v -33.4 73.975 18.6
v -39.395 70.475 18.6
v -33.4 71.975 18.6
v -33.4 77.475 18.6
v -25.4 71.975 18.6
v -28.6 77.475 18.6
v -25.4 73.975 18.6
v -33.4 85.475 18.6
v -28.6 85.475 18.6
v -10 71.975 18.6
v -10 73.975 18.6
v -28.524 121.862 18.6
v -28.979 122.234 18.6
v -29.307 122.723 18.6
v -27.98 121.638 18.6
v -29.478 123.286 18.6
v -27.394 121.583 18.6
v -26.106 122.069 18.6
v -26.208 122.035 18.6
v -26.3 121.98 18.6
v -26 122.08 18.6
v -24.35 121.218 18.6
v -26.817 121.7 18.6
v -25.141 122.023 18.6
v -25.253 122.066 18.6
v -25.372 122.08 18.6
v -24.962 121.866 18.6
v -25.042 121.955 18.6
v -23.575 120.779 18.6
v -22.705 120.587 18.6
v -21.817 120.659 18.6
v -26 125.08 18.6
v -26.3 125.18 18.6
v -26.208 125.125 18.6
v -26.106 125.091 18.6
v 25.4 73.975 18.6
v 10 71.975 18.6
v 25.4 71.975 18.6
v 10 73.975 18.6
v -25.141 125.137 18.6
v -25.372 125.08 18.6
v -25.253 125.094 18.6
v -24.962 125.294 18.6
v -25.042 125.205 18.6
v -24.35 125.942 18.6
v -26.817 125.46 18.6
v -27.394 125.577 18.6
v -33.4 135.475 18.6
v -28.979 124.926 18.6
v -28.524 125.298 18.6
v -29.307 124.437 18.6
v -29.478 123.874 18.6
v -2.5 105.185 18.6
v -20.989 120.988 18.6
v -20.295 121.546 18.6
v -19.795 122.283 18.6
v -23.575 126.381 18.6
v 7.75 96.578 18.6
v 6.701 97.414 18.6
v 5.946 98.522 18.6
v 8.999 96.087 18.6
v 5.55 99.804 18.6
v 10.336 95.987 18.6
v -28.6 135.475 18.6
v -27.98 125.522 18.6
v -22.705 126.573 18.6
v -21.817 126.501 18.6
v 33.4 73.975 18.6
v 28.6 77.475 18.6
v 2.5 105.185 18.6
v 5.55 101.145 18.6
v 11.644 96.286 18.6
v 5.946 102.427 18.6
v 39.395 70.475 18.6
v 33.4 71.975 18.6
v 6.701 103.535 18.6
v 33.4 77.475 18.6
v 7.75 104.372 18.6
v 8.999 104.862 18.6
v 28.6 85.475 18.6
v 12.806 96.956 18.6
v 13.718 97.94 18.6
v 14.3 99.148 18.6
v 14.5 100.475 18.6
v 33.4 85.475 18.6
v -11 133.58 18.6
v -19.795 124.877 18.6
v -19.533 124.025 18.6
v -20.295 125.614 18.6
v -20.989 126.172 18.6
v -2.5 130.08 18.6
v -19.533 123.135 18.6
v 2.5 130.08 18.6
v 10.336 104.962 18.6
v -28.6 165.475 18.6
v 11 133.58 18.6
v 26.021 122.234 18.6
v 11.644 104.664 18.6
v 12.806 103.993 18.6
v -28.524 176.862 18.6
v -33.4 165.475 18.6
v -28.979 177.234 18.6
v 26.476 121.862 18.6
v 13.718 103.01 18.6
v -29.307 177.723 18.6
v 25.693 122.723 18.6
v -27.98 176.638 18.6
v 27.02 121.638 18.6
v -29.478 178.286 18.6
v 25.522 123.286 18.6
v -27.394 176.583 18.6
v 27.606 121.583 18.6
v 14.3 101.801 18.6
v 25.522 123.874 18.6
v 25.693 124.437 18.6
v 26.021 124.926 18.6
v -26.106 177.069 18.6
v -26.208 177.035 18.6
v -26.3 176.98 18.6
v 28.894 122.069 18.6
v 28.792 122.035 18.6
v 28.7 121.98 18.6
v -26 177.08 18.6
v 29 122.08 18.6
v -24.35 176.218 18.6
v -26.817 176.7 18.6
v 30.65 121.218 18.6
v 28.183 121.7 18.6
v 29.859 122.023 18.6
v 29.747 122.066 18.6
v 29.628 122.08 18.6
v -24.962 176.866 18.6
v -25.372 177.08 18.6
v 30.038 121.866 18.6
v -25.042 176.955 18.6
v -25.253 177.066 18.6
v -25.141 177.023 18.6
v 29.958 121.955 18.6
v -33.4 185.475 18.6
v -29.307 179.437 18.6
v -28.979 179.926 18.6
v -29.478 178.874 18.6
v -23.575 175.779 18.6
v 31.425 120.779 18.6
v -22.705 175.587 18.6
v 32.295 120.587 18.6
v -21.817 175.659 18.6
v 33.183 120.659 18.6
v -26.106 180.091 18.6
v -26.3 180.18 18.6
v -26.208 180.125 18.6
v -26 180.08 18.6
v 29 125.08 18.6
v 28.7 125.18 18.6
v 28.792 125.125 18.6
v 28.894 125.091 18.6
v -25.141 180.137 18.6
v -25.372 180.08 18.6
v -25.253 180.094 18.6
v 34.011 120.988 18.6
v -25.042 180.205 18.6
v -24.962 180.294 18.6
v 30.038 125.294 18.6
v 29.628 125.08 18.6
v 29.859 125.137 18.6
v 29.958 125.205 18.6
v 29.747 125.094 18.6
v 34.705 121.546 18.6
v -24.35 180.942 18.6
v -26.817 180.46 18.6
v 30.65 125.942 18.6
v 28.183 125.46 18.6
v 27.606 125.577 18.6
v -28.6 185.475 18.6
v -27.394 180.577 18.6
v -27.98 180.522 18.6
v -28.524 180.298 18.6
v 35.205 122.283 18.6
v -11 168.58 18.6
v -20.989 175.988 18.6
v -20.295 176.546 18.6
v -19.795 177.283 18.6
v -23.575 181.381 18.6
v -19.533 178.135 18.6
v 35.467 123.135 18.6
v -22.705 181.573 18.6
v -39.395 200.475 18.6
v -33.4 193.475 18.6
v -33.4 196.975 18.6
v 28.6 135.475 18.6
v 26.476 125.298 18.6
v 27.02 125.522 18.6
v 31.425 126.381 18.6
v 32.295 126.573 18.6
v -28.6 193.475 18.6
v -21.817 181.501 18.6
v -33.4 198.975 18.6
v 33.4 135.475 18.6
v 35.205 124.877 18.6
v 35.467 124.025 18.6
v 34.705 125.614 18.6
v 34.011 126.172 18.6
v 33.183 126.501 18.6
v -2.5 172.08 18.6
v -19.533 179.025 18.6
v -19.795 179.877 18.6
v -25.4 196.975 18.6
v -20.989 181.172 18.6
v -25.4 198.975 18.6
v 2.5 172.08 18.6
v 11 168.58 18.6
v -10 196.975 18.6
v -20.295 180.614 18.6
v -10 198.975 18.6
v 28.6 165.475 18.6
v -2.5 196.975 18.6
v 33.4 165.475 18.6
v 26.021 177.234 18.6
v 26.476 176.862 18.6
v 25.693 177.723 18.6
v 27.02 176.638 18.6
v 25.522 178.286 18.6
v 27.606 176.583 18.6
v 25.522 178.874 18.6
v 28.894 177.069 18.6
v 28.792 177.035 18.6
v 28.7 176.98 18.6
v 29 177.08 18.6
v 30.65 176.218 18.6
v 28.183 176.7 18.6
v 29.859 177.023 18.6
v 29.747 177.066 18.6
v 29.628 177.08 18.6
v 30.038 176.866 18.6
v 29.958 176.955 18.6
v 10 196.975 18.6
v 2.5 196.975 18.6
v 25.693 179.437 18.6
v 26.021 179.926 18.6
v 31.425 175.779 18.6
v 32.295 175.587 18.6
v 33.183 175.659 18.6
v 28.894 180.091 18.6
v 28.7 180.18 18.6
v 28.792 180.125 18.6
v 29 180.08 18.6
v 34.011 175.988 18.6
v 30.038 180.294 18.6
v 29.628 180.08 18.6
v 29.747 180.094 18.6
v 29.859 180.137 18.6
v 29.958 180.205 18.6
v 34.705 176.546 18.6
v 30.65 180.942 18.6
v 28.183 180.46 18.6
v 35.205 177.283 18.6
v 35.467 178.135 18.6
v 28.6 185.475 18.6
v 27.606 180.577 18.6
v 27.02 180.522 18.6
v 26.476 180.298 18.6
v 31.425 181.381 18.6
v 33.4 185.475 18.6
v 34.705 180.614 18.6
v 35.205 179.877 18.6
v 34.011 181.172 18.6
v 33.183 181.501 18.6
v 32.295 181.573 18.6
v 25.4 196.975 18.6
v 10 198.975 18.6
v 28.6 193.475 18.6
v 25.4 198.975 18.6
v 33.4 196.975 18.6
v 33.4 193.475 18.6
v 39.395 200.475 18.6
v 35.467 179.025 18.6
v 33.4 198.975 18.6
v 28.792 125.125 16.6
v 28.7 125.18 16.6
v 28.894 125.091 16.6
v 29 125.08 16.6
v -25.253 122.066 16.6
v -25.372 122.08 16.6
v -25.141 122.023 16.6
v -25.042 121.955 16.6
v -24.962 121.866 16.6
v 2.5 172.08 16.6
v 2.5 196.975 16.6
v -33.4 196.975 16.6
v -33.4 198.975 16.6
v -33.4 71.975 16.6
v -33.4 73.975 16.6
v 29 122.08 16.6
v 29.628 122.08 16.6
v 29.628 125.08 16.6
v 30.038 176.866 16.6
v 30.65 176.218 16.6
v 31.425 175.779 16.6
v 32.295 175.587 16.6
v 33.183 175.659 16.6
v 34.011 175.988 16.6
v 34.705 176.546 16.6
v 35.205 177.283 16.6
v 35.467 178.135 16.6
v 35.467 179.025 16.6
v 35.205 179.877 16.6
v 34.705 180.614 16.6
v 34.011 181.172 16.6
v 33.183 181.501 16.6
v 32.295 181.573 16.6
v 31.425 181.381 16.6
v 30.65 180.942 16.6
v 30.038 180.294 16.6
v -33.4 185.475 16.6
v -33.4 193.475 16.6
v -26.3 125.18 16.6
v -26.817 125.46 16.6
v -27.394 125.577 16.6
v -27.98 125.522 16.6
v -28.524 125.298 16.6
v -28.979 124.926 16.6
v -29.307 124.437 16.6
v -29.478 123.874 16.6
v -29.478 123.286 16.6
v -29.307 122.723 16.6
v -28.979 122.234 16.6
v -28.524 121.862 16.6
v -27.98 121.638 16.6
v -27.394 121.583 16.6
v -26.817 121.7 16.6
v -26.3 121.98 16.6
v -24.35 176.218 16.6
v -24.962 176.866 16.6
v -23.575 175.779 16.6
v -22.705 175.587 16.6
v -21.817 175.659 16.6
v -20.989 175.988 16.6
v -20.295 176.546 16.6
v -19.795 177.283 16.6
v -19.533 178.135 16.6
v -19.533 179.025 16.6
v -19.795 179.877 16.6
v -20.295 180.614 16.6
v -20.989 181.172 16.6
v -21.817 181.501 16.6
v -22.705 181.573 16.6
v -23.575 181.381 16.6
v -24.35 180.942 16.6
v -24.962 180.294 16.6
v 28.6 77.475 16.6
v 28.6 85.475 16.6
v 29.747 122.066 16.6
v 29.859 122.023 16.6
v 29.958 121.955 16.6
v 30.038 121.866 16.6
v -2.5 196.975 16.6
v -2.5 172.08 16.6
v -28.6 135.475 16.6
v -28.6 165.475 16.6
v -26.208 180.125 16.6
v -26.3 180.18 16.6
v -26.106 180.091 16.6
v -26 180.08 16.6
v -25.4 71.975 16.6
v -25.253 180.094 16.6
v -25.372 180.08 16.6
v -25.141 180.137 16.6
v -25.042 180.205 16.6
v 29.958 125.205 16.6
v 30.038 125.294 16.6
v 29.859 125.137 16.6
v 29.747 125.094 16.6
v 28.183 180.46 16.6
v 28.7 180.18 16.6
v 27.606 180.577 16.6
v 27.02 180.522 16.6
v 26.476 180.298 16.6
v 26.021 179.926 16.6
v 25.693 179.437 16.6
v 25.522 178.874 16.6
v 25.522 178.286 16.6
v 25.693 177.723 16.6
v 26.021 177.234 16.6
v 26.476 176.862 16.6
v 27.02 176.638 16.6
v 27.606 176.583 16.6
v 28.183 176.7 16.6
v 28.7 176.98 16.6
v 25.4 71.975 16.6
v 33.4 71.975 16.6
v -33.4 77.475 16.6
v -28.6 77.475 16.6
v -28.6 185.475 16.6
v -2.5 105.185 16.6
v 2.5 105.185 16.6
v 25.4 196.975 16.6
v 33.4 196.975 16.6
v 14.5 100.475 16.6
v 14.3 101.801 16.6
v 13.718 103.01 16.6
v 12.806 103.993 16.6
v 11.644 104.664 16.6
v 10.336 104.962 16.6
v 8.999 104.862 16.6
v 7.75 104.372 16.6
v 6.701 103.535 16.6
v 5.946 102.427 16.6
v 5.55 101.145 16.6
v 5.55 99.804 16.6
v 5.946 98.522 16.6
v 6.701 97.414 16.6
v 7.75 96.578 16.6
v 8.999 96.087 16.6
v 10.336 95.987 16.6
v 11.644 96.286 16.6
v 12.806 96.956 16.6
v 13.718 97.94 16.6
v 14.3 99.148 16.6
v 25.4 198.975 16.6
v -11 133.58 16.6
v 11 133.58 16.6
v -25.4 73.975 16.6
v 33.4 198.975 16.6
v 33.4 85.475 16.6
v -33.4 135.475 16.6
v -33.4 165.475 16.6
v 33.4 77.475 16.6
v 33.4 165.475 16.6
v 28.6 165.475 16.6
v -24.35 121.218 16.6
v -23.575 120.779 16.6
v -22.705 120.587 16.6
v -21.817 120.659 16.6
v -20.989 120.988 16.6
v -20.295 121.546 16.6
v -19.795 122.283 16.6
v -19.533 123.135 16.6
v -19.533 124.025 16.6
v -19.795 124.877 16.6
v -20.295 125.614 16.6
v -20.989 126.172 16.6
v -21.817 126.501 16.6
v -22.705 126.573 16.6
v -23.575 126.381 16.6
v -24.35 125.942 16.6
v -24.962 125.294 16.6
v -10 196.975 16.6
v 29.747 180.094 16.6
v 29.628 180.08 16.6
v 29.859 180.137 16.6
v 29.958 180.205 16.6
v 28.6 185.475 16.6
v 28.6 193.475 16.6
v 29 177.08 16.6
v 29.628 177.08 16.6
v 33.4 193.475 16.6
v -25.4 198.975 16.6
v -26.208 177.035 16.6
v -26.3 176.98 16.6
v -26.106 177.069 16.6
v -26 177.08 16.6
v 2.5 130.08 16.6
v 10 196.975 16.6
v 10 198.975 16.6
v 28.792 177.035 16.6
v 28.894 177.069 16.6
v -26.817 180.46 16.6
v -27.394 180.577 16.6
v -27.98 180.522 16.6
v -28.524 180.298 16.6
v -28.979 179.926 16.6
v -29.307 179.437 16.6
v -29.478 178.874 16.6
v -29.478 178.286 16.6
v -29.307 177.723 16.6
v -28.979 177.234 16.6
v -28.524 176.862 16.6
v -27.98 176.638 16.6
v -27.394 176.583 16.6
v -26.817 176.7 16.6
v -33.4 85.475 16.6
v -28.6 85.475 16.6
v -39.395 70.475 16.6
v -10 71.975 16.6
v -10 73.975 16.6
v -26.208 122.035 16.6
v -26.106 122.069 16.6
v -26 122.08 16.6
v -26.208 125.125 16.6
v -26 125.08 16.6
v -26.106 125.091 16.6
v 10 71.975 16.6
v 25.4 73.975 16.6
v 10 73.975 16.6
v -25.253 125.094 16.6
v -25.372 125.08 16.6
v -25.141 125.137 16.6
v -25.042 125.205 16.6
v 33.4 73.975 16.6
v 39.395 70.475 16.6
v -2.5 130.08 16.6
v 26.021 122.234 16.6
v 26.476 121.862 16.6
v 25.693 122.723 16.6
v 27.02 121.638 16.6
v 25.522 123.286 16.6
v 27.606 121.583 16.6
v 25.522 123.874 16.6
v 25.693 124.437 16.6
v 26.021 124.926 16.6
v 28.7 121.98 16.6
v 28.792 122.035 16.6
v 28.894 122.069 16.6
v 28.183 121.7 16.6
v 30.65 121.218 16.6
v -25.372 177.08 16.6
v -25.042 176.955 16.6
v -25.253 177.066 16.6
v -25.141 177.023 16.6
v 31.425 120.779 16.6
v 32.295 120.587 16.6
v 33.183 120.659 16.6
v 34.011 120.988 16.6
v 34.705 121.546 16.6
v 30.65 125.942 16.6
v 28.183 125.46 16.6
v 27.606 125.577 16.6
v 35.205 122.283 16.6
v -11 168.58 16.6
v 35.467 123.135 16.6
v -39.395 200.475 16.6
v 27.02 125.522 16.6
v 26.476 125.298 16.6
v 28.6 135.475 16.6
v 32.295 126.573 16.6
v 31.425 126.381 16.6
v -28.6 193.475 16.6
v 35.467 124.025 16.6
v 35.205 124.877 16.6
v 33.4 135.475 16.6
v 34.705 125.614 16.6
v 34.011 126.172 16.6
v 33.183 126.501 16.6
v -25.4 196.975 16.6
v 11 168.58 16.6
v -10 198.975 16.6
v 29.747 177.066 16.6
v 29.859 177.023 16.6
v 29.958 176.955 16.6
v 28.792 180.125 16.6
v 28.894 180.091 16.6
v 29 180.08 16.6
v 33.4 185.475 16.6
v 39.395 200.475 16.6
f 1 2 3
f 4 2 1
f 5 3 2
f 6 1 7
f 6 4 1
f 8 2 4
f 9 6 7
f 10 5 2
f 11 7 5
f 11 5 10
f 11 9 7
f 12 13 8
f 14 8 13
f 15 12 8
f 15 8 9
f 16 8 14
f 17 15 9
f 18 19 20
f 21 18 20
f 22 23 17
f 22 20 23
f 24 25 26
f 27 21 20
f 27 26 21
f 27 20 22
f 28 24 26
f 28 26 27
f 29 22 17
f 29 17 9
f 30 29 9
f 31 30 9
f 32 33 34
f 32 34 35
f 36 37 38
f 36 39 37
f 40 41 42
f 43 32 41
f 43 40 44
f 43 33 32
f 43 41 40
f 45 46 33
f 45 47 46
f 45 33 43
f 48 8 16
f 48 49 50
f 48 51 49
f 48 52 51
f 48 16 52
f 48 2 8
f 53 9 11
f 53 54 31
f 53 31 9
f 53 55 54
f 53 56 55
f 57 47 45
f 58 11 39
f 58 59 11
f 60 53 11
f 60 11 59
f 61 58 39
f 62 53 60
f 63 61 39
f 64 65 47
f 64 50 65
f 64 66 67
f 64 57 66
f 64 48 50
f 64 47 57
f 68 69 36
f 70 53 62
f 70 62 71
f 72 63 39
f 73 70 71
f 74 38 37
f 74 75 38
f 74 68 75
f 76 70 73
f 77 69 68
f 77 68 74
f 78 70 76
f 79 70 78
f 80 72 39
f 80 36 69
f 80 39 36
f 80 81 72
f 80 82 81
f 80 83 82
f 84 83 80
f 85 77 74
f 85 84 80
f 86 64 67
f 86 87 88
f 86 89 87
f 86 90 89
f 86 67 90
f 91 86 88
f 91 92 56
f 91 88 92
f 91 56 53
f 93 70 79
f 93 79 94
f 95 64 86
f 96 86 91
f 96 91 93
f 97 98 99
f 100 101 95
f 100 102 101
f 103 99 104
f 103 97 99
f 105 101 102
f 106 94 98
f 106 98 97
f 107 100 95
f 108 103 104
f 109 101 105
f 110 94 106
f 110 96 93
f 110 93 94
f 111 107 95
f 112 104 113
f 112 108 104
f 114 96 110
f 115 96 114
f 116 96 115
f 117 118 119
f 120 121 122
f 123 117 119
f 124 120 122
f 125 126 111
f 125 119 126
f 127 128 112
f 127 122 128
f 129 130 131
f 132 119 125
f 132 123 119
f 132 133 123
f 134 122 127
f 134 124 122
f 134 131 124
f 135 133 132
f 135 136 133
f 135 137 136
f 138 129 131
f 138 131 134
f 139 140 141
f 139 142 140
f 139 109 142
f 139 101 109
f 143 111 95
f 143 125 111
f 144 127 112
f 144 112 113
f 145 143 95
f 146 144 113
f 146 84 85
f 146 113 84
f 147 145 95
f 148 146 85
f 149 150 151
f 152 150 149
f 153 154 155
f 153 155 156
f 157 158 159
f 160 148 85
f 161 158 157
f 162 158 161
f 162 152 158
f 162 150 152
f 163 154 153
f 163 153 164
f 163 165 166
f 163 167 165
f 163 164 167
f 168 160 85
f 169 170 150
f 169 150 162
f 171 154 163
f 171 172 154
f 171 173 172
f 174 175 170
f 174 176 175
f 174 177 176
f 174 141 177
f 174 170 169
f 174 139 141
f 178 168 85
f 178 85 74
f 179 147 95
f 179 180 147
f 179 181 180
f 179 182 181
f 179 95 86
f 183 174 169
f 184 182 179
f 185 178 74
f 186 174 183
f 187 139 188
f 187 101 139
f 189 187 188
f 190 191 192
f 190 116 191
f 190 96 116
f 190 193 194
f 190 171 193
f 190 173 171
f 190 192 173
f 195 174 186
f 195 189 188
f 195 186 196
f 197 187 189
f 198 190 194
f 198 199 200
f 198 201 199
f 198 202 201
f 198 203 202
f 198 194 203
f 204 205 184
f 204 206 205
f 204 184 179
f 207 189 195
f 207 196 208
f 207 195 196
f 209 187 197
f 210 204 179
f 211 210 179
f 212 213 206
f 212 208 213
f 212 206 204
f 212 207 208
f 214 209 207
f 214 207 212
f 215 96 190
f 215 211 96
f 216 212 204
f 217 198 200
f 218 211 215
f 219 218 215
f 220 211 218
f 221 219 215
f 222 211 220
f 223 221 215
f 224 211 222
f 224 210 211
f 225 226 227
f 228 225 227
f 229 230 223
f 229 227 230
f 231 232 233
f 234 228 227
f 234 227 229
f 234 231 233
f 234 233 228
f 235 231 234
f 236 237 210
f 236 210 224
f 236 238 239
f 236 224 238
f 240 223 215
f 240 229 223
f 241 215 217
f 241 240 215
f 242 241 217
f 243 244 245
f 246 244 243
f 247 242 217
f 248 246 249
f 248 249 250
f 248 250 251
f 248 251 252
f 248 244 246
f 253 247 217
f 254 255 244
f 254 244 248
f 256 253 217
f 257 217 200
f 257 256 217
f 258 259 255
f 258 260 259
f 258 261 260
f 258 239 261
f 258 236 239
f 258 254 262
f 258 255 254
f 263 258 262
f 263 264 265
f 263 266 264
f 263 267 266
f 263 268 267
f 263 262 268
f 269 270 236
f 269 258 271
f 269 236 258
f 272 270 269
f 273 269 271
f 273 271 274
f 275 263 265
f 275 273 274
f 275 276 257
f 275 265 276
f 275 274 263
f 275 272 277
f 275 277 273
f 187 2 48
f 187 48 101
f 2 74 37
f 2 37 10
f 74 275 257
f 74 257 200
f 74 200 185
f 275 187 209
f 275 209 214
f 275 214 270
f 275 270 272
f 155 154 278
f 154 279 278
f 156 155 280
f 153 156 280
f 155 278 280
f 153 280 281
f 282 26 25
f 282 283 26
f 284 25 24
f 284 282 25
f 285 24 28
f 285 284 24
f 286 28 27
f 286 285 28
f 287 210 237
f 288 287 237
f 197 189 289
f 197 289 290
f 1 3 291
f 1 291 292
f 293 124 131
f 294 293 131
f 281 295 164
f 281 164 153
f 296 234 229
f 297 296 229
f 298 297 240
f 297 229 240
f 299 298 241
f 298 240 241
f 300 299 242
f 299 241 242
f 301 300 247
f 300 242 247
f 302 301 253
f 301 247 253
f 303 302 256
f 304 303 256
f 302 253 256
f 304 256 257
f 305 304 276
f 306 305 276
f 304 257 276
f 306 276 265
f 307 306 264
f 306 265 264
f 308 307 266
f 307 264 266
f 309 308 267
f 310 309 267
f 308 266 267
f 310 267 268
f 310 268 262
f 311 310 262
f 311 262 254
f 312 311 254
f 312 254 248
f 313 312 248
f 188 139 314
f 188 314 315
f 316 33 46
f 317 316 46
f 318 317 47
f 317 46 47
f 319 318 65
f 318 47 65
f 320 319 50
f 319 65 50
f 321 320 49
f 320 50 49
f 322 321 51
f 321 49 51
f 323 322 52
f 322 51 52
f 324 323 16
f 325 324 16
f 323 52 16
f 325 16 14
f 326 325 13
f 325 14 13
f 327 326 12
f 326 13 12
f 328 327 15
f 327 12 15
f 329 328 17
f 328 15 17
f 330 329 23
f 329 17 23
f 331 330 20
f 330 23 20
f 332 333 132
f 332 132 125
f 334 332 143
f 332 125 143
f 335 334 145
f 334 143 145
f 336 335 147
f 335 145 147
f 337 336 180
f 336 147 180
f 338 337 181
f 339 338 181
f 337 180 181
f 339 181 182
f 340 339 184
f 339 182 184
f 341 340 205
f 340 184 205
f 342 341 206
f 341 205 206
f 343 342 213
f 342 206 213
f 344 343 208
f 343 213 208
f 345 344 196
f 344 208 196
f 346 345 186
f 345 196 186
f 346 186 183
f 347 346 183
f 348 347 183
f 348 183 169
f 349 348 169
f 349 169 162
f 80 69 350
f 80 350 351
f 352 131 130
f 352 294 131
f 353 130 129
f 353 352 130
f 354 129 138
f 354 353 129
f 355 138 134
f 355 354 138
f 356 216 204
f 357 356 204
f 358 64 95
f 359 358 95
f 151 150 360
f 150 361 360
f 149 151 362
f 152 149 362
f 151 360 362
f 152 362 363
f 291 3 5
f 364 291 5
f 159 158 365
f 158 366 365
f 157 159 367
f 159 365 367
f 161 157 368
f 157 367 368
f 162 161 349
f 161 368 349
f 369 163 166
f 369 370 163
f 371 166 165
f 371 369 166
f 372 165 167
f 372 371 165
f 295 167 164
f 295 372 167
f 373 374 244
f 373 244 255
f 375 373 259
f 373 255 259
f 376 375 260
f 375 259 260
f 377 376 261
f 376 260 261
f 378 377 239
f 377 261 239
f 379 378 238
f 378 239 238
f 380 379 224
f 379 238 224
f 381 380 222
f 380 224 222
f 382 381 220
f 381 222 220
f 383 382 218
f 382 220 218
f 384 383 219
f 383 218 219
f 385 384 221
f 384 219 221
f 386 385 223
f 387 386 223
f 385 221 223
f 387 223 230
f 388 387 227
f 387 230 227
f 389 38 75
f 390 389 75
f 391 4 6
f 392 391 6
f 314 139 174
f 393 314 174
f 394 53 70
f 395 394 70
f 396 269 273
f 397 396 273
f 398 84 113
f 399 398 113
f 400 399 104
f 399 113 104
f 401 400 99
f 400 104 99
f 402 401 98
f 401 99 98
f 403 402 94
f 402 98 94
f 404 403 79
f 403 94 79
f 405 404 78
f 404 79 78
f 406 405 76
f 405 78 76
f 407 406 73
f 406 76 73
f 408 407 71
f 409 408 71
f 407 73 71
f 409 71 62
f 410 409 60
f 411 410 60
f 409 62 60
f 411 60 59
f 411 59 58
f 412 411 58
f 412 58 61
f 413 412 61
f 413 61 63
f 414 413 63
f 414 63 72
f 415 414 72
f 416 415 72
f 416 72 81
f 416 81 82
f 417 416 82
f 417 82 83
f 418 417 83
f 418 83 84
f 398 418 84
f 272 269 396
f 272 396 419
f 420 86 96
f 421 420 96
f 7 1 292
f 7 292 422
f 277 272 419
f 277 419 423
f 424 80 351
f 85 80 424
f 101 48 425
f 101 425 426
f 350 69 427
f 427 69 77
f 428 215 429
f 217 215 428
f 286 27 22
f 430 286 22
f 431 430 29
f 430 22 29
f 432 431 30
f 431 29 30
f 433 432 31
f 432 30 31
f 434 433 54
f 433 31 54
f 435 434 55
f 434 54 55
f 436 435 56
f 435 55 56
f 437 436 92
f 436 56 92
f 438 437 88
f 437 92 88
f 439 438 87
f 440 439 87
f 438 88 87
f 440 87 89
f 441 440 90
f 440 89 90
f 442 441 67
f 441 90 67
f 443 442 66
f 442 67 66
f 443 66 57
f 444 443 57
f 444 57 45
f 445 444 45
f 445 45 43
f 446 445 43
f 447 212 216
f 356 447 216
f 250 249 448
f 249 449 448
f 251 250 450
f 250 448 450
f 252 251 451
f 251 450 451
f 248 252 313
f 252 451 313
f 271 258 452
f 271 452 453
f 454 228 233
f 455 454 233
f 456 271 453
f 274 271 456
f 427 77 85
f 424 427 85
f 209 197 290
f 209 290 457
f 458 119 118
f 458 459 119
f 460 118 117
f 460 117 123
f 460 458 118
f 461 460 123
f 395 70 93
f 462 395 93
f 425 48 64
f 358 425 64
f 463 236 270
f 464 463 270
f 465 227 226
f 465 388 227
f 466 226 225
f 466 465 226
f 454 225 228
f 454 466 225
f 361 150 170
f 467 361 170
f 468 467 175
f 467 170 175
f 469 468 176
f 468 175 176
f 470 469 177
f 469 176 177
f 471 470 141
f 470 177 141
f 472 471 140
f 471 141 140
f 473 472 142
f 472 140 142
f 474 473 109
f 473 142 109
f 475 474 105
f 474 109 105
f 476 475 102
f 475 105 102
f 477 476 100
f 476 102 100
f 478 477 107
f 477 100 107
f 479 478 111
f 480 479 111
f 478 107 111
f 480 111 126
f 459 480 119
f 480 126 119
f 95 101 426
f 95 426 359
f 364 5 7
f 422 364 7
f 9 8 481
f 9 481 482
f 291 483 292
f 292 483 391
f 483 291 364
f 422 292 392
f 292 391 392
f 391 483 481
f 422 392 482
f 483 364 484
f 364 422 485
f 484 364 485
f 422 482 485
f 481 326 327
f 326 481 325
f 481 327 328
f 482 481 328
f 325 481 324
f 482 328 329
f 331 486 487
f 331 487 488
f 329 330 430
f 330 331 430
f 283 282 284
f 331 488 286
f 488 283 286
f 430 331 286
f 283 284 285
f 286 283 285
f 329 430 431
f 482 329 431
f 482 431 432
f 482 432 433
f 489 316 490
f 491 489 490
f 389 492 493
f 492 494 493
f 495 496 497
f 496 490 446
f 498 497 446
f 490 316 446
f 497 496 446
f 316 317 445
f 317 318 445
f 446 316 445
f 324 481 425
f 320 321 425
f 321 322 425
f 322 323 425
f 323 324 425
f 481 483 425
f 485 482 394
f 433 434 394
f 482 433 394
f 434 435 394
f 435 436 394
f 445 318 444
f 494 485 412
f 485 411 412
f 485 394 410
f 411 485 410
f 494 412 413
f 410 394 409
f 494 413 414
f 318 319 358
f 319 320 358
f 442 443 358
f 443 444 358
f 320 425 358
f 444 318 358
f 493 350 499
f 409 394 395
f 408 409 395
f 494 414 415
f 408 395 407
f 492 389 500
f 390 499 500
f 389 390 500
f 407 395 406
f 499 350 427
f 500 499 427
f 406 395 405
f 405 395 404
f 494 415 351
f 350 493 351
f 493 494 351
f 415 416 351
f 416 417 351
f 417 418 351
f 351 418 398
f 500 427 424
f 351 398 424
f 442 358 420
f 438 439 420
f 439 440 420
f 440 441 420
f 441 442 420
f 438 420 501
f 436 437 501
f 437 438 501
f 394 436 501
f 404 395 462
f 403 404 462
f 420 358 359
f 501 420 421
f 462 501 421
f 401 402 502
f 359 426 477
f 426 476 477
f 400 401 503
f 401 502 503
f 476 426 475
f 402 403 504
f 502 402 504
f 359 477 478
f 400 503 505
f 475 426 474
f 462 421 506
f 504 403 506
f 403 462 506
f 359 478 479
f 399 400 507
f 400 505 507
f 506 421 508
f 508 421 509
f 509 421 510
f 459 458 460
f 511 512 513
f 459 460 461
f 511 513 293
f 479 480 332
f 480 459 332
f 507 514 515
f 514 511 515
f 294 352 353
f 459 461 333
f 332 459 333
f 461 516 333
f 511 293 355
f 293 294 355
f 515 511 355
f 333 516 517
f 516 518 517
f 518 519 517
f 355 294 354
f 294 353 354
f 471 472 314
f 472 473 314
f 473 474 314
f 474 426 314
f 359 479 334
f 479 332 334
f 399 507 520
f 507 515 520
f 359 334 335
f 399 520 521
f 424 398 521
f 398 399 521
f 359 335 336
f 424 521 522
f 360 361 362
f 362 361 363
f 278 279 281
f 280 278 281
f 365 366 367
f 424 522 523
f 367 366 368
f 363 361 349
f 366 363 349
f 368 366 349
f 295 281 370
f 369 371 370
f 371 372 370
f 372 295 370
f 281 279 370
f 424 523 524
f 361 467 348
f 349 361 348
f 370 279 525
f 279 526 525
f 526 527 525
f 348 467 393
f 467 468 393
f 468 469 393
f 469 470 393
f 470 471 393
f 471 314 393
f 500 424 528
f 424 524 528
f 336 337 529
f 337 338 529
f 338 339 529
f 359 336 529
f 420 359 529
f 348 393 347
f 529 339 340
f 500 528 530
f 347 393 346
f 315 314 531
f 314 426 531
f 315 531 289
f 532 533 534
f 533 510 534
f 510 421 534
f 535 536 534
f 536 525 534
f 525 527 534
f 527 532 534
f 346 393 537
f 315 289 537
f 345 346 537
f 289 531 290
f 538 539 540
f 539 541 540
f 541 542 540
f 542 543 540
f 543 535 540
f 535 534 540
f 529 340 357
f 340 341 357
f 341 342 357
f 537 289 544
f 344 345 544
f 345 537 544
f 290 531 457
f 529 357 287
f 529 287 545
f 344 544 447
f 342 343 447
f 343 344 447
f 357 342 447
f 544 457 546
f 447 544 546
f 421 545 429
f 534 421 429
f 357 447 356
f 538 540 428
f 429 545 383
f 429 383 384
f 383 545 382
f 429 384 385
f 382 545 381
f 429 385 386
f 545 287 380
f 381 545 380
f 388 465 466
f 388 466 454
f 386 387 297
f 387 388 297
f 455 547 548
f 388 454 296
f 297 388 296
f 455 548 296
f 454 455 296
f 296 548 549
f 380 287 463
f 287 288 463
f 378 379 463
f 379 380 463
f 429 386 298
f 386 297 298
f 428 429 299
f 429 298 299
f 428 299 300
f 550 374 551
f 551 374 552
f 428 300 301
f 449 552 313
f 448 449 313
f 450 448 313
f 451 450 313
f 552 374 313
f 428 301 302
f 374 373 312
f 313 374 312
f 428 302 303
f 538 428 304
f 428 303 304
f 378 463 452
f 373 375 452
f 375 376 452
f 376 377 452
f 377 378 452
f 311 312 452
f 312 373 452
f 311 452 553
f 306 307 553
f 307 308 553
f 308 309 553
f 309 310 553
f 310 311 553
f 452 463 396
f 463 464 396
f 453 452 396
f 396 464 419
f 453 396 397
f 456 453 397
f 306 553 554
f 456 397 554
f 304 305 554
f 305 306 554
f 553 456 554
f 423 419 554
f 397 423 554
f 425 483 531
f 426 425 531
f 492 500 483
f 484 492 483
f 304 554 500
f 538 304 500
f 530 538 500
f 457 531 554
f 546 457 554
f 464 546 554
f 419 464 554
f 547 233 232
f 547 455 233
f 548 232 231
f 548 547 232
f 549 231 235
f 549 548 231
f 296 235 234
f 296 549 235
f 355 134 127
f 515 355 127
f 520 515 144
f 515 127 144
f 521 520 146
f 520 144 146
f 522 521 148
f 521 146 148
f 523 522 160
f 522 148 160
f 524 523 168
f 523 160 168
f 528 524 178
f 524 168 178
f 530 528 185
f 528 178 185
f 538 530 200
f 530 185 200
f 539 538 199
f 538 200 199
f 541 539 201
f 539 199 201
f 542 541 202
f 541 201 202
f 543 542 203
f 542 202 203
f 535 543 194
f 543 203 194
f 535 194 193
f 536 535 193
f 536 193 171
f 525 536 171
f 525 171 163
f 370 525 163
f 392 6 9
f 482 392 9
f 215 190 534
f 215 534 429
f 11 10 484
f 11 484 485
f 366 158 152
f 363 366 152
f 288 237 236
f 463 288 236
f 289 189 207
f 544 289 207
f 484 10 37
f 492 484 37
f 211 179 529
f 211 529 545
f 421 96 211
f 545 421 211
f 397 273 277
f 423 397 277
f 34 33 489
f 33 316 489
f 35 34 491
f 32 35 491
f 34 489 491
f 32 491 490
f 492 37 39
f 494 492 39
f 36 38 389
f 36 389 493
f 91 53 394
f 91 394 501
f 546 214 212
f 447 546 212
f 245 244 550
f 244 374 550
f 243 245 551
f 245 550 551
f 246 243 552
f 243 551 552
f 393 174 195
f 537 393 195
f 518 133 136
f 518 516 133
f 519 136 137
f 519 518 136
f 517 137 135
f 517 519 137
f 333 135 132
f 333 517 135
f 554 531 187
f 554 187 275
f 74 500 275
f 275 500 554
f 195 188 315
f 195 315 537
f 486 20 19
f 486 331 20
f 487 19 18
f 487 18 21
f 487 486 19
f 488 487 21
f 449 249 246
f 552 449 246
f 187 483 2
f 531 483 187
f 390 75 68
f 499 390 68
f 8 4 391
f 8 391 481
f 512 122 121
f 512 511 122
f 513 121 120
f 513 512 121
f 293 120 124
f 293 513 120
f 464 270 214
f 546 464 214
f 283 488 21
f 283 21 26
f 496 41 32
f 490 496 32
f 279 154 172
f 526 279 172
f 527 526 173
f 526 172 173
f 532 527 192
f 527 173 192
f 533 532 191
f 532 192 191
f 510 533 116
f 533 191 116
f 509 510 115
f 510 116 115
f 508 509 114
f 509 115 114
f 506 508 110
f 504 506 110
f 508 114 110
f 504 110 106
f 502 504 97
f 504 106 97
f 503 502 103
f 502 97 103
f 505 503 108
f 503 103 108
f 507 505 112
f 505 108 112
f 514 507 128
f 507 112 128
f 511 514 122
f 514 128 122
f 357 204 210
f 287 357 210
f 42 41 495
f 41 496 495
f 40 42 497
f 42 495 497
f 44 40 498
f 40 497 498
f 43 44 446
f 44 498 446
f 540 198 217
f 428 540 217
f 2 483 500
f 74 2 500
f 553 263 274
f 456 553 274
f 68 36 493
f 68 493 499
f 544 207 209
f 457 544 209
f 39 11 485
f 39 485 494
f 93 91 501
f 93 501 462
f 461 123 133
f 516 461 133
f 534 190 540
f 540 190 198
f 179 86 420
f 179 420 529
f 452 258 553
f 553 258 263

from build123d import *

# Parameters (mm, degrees)
SKETCH1_W              = 78.789320596
SKETCH1_H              = 130
PANEL_DEPTH            = 2
SUCKER_HOLES_REACH     = 206.318
FILLET1_R              = 0.5
SIDE_PLATE_SLOTS_REACH = 206.318
SKETCH3_W              = 22
SKETCH3_H              = 35
SKETCH3_W_2            = 5
SKETCH3_H_2            = 24.894660299
SKETCH3_W_3            = 8
SKETCH3_H_3            = 2
SKETCH3_W_4            = 4.8
SKETCH3_H_4            = 8
SKETCH3_H_5            = 30
SKETCH3_W_5            = 20
CUT_EXTRUDE3_REACH     = 206.318
SKETCH4_R              = 4.5


with BuildPart() as part:
    # Sketch1 → panel (new body)
    with BuildSketch(Plane.XY.offset(16.6)):
        with Locations((0, 135.474649456)):
            Rectangle(SKETCH1_W, SKETCH1_H)
    extrude(amount=PANEL_DEPTH)

    # Sketch2 → sucker holes (cut, up to next)
    with BuildSketch(Plane.XY.offset(18.6), mode=Mode.PRIVATE) as sucker_holes_sk1:
        with BuildLine():
            ThreePointArc((-26.177124344, 125.079989158), (-29.5, 123.579989158), (-26.177124344, 122.079989158))
            Line((-26.177124344, 122.079989158), (-25.098076211, 122.079989158))
            ThreePointArc((-25.098076211, 122.079989158), (-19.5, 123.579989158), (-25.098076211, 125.079989158))
            Line((-25.098076211, 125.079989158), (-26.177124344, 125.079989158))
        make_face()
    sucker_holes_tool1 = extrude(sucker_holes_sk1.sketch, amount=-SUCKER_HOLES_REACH, mode=Mode.PRIVATE) & part.part
    # Sketch2 → sucker holes (cut, up to next)
    with BuildSketch(Plane.XY.offset(18.6), mode=Mode.PRIVATE) as sucker_holes_sk2:
        with BuildLine():
            ThreePointArc((-26.177124344, 180.079989158), (-29.5, 178.579989158), (-26.177124344, 177.079989158))
            Line((-26.177124344, 177.079989158), (-25.098076211, 177.079989158))
            ThreePointArc((-25.098076211, 177.079989158), (-19.5, 178.579989158), (-25.098076211, 180.079989158))
            Line((-25.098076211, 180.079989158), (-26.177124344, 180.079989158))
        make_face()
    sucker_holes_tool2 = extrude(sucker_holes_sk2.sketch, amount=-SUCKER_HOLES_REACH, mode=Mode.PRIVATE) & part.part
    # Sketch2 → sucker holes (cut, up to next)
    with BuildSketch(Plane.XY.offset(18.6), mode=Mode.PRIVATE) as sucker_holes_sk3:
        with BuildLine():
            ThreePointArc((28.822875656, 180.079989158), (25.5, 178.579989158), (28.822875656, 177.079989158))
            Line((28.822875656, 177.079989158), (29.901923789, 177.079989158))
            ThreePointArc((29.901923789, 177.079989158), (35.5, 178.579989158), (29.901923789, 180.079989158))
            Line((29.901923789, 180.079989158), (28.822875656, 180.079989158))
        make_face()
    sucker_holes_tool3 = extrude(sucker_holes_sk3.sketch, amount=-SUCKER_HOLES_REACH, mode=Mode.PRIVATE) & part.part
    # Sketch2 → sucker holes (cut, up to next)
    with BuildSketch(Plane.XY.offset(18.6), mode=Mode.PRIVATE) as sucker_holes_sk4:
        with BuildLine():
            ThreePointArc((28.822875656, 125.079989158), (25.5, 123.579989158), (28.822875656, 122.079989158))
            Line((28.822875656, 122.079989158), (29.901923789, 122.079989158))
            ThreePointArc((29.901923789, 122.079989158), (35.5, 123.579989158), (29.901923789, 125.079989158))
            Line((29.901923789, 125.079989158), (28.822875656, 125.079989158))
        make_face()
    sucker_holes_tool4 = extrude(sucker_holes_sk4.sketch, amount=-SUCKER_HOLES_REACH, mode=Mode.PRIVATE) & part.part
    add(sucker_holes_tool1.solids().sort_by_distance((-24.075669, 123.579989, 18.6))[0], mode=Mode.SUBTRACT)
    add(sucker_holes_tool2.solids().sort_by_distance((-24.075669, 178.579989, 18.6))[0], mode=Mode.SUBTRACT)
    add(sucker_holes_tool3.solids().sort_by_distance((30.924331, 178.579989, 18.6))[0], mode=Mode.SUBTRACT)
    add(sucker_holes_tool4.solids().sort_by_distance((30.924331, 123.579989, 18.6))[0], mode=Mode.SUBTRACT)

    # Fillet1
    fillet1_edges = [part.edges().sort_by_distance(p)[0] for p in [
        (-26.177124344, 125.079989158, 17.6),
        (-25.098076211, 125.079989158, 17.6),
        (-25.098076211, 122.079989158, 17.6),
        (-26.177124344, 122.079989158, 17.6),
        (-25.098076211, 177.079989158, 17.6),
        (-26.177124344, 177.079989158, 17.6),
        (-26.177124344, 180.079989158, 17.6),
        (-25.098076211, 180.079989158, 17.6),
        (29.901923789, 177.079989158, 17.6),
        (28.822875656, 177.079989158, 17.6),
        (28.822875656, 180.079989158, 17.6),
        (29.901923789, 180.079989158, 17.6),
        (29.901923789, 122.079989158, 17.6),
        (28.822875656, 122.079989158, 17.6),
        (28.822875656, 125.079989158, 17.6),
        (29.901923789, 125.079989158, 17.6),
    ]]
    fillet(fillet1_edges, radius=FILLET1_R)

    # Sketch3 → side plate slots (cut, up to next)
    with BuildSketch(Plane.XY.offset(18.6), mode=Mode.PRIVATE) as side_plate_slots_sk1:
        with Locations((0, 151.079989158)):
            Rectangle(SKETCH3_W, SKETCH3_H)
    side_plate_slots_tool1 = extrude(side_plate_slots_sk1.sketch, amount=-SIDE_PLATE_SLOTS_REACH, mode=Mode.PRIVATE) & part.part
    # Sketch3 → side plate slots (cut, up to next)
    with BuildSketch(Plane.XY.offset(18.6), mode=Mode.PRIVATE) as side_plate_slots_sk2:
        Polygon((-2.5, 196.974649456), (-2.5, 172.079989158), (2.5, 172.079989158), (2.5, 196.974649456), (10, 196.974649456), (10, 198.974649456), (-10, 198.974649456), (-10, 196.974649456), align=None)
    side_plate_slots_tool2 = extrude(side_plate_slots_sk2.sketch, amount=-SIDE_PLATE_SLOTS_REACH, mode=Mode.PRIVATE) & part.part
    # Sketch3 → side plate slots (cut, up to next)
    with BuildSketch(Plane.XY.offset(18.6), mode=Mode.PRIVATE) as side_plate_slots_sk3:
        with Locations((0, 117.632659009)):
            Rectangle(SKETCH3_W_2, SKETCH3_H_2)
    side_plate_slots_tool3 = extrude(side_plate_slots_sk3.sketch, amount=-SIDE_PLATE_SLOTS_REACH, mode=Mode.PRIVATE) & part.part
    # Sketch3 → side plate slots (cut, up to next)
    with BuildSketch(Plane.XY.offset(18.6), mode=Mode.PRIVATE) as side_plate_slots_sk4:
        with Locations((-29.4, 72.974649456)):
            Rectangle(SKETCH3_W_3, SKETCH3_H_3)
    side_plate_slots_tool4 = extrude(side_plate_slots_sk4.sketch, amount=-SIDE_PLATE_SLOTS_REACH, mode=Mode.PRIVATE) & part.part
    # Sketch3 → side plate slots (cut, up to next)
    with BuildSketch(Plane.XY.offset(18.6), mode=Mode.PRIVATE) as side_plate_slots_sk5:
        with Locations((-29.4, 197.974649456)):
            Rectangle(SKETCH3_W_3, SKETCH3_H_3)
    side_plate_slots_tool5 = extrude(side_plate_slots_sk5.sketch, amount=-SIDE_PLATE_SLOTS_REACH, mode=Mode.PRIVATE) & part.part
    # Sketch3 → side plate slots (cut, up to next)
    with BuildSketch(Plane.XY.offset(18.6), mode=Mode.PRIVATE) as side_plate_slots_sk6:
        with Locations((29.4, 197.974649456)):
            Rectangle(SKETCH3_W_3, SKETCH3_H_3)
    side_plate_slots_tool6 = extrude(side_plate_slots_sk6.sketch, amount=-SIDE_PLATE_SLOTS_REACH, mode=Mode.PRIVATE) & part.part
    # Sketch3 → side plate slots (cut, up to next)
    with BuildSketch(Plane.XY.offset(18.6), mode=Mode.PRIVATE) as side_plate_slots_sk7:
        with Locations((-31, 189.474649456)):
            Rectangle(SKETCH3_W_4, SKETCH3_H_4)
    side_plate_slots_tool7 = extrude(side_plate_slots_sk7.sketch, amount=-SIDE_PLATE_SLOTS_REACH, mode=Mode.PRIVATE) & part.part
    # Sketch3 → side plate slots (cut, up to next)
    with BuildSketch(Plane.XY.offset(18.6), mode=Mode.PRIVATE) as side_plate_slots_sk8:
        with Locations((-31, 150.474649456)):
            Rectangle(SKETCH3_W_4, SKETCH3_H_5)
    side_plate_slots_tool8 = extrude(side_plate_slots_sk8.sketch, amount=-SIDE_PLATE_SLOTS_REACH, mode=Mode.PRIVATE) & part.part
    # Sketch3 → side plate slots (cut, up to next)
    with BuildSketch(Plane.XY.offset(18.6), mode=Mode.PRIVATE) as side_plate_slots_sk9:
        with Locations((-31, 81.474649456)):
            Rectangle(SKETCH3_W_4, SKETCH3_H_4)
    side_plate_slots_tool9 = extrude(side_plate_slots_sk9.sketch, amount=-SIDE_PLATE_SLOTS_REACH, mode=Mode.PRIVATE) & part.part
    # Sketch3 → side plate slots (cut, up to next)
    with BuildSketch(Plane.XY.offset(18.6), mode=Mode.PRIVATE) as side_plate_slots_sk10:
        with Locations((31, 81.474649456)):
            Rectangle(SKETCH3_W_4, SKETCH3_H_4)
    side_plate_slots_tool10 = extrude(side_plate_slots_sk10.sketch, amount=-SIDE_PLATE_SLOTS_REACH, mode=Mode.PRIVATE) & part.part
    # Sketch3 → side plate slots (cut, up to next)
    with BuildSketch(Plane.XY.offset(18.6), mode=Mode.PRIVATE) as side_plate_slots_sk11:
        with Locations((31, 150.474649456)):
            Rectangle(SKETCH3_W_4, SKETCH3_H_5)
    side_plate_slots_tool11 = extrude(side_plate_slots_sk11.sketch, amount=-SIDE_PLATE_SLOTS_REACH, mode=Mode.PRIVATE) & part.part
    # Sketch3 → side plate slots (cut, up to next)
    with BuildSketch(Plane.XY.offset(18.6), mode=Mode.PRIVATE) as side_plate_slots_sk12:
        with Locations((31, 189.474649456)):
            Rectangle(SKETCH3_W_4, SKETCH3_H_4)
    side_plate_slots_tool12 = extrude(side_plate_slots_sk12.sketch, amount=-SIDE_PLATE_SLOTS_REACH, mode=Mode.PRIVATE) & part.part
    # Sketch3 → side plate slots (cut, up to next)
    with BuildSketch(Plane.XY.offset(18.6), mode=Mode.PRIVATE) as side_plate_slots_sk13:
        with Locations((29.4, 72.974649456)):
            Rectangle(SKETCH3_W_3, SKETCH3_H_3)
    side_plate_slots_tool13 = extrude(side_plate_slots_sk13.sketch, amount=-SIDE_PLATE_SLOTS_REACH, mode=Mode.PRIVATE) & part.part
    # Sketch3 → side plate slots (cut, up to next)
    with BuildSketch(Plane.XY.offset(18.6), mode=Mode.PRIVATE) as side_plate_slots_sk14:
        with Locations((0, 72.974649456)):
            Rectangle(SKETCH3_W_5, SKETCH3_H_3)
    side_plate_slots_tool14 = extrude(side_plate_slots_sk14.sketch, amount=-SIDE_PLATE_SLOTS_REACH, mode=Mode.PRIVATE) & part.part
    add(side_plate_slots_tool1.solids().sort_by_distance((0, 151.079989, 18.6))[0], mode=Mode.SUBTRACT)
    add(side_plate_slots_tool2.solids().sort_by_distance((0, 187.797718, 18.6))[0], mode=Mode.SUBTRACT)
    add(side_plate_slots_tool3.solids().sort_by_distance((0, 117.632659, 18.6))[0], mode=Mode.SUBTRACT)
    add(side_plate_slots_tool4.solids().sort_by_distance((-29.4, 72.974649, 18.6))[0], mode=Mode.SUBTRACT)
    add(side_plate_slots_tool5.solids().sort_by_distance((-29.4, 197.974649, 18.6))[0], mode=Mode.SUBTRACT)
    add(side_plate_slots_tool6.solids().sort_by_distance((29.4, 197.974649, 18.6))[0], mode=Mode.SUBTRACT)
    add(side_plate_slots_tool7.solids().sort_by_distance((-31, 189.474649, 18.6))[0], mode=Mode.SUBTRACT)
    add(side_plate_slots_tool8.solids().sort_by_distance((-31, 150.474649, 18.6))[0], mode=Mode.SUBTRACT)
    add(side_plate_slots_tool9.solids().sort_by_distance((-31, 81.474649, 18.6))[0], mode=Mode.SUBTRACT)
    add(side_plate_slots_tool10.solids().sort_by_distance((31, 81.474649, 18.6))[0], mode=Mode.SUBTRACT)
    add(side_plate_slots_tool11.solids().sort_by_distance((31, 150.474649, 18.6))[0], mode=Mode.SUBTRACT)
    add(side_plate_slots_tool12.solids().sort_by_distance((31, 189.474649, 18.6))[0], mode=Mode.SUBTRACT)
    add(side_plate_slots_tool13.solids().sort_by_distance((29.4, 72.974649, 18.6))[0], mode=Mode.SUBTRACT)
    add(side_plate_slots_tool14.solids().sort_by_distance((0, 72.974649, 18.6))[0], mode=Mode.SUBTRACT)

    # Sketch4 → Cut-Extrude3 (cut, up to next)
    with BuildSketch(Plane.XY.offset(18.6), mode=Mode.PRIVATE) as cut_extrude3_sk1:
        with Locations((10, 100.474649456)):
            Circle(SKETCH4_R)
    cut_extrude3_tool1 = extrude(cut_extrude3_sk1.sketch, amount=-CUT_EXTRUDE3_REACH, mode=Mode.PRIVATE) & part.part
    add(cut_extrude3_tool1.solids().sort_by_distance((10, 100.474649, 18.6))[0], mode=Mode.SUBTRACT)


solid = part.part
